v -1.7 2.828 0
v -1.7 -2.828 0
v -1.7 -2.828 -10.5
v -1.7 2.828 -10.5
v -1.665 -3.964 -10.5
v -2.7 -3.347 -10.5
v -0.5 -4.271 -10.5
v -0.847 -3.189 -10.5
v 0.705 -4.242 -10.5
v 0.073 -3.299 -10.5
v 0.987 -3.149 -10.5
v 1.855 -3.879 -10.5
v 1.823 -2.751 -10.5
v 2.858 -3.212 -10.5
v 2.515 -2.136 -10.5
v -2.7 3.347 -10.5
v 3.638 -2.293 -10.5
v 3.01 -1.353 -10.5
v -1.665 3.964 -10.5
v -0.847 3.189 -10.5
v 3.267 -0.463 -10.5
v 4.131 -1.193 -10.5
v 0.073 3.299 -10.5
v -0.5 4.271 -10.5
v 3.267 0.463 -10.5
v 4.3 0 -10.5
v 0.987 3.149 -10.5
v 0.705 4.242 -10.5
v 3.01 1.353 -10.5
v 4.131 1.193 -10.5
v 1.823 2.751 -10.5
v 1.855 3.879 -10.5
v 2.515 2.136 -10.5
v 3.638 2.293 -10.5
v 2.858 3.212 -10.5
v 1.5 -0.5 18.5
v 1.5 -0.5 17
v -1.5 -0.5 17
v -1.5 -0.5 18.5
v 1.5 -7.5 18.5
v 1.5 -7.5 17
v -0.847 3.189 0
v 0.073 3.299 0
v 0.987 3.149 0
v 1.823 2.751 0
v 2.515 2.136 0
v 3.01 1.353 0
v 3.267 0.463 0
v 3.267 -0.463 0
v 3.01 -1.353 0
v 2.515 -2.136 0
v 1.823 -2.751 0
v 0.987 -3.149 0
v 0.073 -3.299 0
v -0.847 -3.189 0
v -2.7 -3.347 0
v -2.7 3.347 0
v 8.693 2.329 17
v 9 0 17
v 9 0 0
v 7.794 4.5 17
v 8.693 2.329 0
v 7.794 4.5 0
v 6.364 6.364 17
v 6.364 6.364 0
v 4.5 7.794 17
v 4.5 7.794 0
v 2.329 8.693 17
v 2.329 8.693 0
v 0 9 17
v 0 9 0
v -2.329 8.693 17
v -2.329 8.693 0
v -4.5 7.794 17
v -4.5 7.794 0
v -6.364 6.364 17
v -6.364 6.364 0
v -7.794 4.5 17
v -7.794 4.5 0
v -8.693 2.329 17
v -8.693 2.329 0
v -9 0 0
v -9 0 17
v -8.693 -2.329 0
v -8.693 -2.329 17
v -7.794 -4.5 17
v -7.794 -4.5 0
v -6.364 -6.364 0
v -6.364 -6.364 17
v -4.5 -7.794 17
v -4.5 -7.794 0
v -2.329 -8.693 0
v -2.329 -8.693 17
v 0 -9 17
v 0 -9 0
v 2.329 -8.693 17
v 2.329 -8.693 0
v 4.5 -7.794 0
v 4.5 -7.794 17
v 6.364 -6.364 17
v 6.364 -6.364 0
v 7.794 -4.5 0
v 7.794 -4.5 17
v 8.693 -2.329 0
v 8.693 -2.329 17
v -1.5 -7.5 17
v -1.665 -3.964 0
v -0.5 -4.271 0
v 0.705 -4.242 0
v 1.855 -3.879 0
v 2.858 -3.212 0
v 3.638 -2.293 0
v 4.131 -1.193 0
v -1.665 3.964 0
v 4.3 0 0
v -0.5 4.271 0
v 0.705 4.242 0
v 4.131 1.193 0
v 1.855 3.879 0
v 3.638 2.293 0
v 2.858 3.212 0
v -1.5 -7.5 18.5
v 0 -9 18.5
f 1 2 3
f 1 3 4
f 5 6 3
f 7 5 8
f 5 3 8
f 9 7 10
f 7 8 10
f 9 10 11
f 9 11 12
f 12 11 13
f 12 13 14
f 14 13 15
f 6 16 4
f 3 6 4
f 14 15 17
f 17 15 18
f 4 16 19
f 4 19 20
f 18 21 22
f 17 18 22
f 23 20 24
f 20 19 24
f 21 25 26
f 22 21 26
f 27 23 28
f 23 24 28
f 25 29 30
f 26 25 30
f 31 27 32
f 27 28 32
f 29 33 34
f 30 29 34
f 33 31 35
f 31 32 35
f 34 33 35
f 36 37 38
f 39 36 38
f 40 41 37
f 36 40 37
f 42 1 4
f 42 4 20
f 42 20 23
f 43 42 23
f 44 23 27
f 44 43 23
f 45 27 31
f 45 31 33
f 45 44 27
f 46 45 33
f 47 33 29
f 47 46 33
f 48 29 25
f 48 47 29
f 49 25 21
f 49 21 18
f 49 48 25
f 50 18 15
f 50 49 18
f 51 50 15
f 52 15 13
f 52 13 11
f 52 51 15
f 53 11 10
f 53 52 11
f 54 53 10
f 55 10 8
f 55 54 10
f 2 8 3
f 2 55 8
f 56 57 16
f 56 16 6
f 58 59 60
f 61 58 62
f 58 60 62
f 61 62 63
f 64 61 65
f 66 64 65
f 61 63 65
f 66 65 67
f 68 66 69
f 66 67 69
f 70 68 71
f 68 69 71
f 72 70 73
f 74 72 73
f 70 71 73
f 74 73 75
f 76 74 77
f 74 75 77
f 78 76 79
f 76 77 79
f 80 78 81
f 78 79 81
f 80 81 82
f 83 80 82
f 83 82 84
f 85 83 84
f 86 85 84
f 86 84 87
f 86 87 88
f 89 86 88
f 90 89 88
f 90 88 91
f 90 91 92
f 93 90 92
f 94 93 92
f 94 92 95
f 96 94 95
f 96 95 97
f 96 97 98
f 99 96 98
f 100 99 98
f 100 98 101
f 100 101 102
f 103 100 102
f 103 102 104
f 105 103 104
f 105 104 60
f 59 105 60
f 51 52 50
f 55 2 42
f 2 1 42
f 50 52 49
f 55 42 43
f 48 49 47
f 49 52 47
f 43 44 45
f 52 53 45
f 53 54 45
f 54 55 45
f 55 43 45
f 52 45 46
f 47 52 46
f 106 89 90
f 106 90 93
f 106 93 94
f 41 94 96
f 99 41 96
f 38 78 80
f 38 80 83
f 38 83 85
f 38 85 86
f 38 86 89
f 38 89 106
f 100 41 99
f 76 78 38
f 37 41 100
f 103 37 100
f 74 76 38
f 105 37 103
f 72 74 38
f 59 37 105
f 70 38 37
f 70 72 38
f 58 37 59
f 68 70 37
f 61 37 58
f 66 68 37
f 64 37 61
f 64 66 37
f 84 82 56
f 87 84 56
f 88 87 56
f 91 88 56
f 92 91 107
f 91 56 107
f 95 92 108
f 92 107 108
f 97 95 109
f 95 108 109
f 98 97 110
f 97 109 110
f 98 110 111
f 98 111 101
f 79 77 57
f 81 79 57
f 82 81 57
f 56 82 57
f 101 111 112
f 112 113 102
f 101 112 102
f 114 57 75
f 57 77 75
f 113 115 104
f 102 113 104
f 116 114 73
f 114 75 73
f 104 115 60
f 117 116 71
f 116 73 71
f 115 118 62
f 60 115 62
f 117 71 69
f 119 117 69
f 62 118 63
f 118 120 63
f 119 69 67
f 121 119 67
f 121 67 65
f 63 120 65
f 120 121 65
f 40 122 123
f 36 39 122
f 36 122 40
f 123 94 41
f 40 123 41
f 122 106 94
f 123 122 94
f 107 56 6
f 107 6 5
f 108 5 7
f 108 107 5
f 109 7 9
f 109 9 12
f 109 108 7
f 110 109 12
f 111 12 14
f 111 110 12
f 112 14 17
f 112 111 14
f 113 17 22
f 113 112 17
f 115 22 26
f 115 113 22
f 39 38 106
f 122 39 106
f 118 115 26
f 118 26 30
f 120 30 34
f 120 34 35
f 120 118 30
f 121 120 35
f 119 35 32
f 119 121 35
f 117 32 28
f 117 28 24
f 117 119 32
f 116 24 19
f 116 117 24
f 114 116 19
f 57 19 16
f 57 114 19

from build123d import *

# Parameters (mm, degrees)
F0_R     = 9
F1_DEPTH = 17
F2_DEPTH = 10.5
F4_DEPTH = 1.5


# Not quite as in the source:
# - a feature names something its author has since deleted; it is built from what else it names


with BuildPart() as f1:
    # F0 (on Top) → F1 (new body)
    with BuildSketch(Plane.XY):
        Circle(F0_R)
        with BuildLine():
            ThreePointArc((-2.7, 3.3466401061), (1.8547236991, 3.8794329483), (4.3, 0))
            ThreePointArc((4.3, 0), (1.8547236991, -3.8794329483), (-2.7, -3.3466401061))
            ThreePointArc((-2.7, -3.3466401061), (-4.3, 0), (-2.7, 3.3466401061))
        make_face(mode=Mode.SUBTRACT)
        with BuildLine():
            ThreePointArc((-2.7, -3.3466401061), (1.8547236991, -3.8794329483), (4.3, 0))
            ThreePointArc((4.3, 0), (1.8547236991, 3.8794329483), (-2.7, 3.3466401061))
            Line((-2.7, 3.3466401061), (-2.7, -3.3466401061))
        make_face()
        with BuildLine():
            Line((-1.7, -2.8284271247), (-1.7, 2.8284271247))
            ThreePointArc((-1.7, 2.8284271247), (3.3, 0), (-1.7, -2.8284271247))
        make_face(mode=Mode.SUBTRACT)
        with BuildLine():
            ThreePointArc((-1.7, -2.8284271247), (3.3, 0), (-1.7, 2.8284271247))
            Line((-1.7, 2.8284271247), (-1.7, -2.8284271247))
        make_face()
        with BuildLine():
            Line((-2.7, -3.3466401061), (-2.7, 3.3466401061))
            ThreePointArc((-2.7, 3.3466401061), (-4.3, 0), (-2.7, -3.3466401061))
        make_face()
    extrude(amount=F1_DEPTH)

    # F0 (on Top) → F2 (join)
    with BuildSketch(Plane.XY):
        with BuildLine():
            ThreePointArc((-2.7, -3.3466401061), (1.8547236991, -3.8794329483), (4.3, 0))
            ThreePointArc((4.3, 0), (1.8547236991, 3.8794329483), (-2.7, 3.3466401061))
            Line((-2.7, 3.3466401061), (-2.7, -3.3466401061))
        make_face()
        with BuildLine():
            Line((-1.7, -2.8284271247), (-1.7, 2.8284271247))
            ThreePointArc((-1.7, 2.8284271247), (3.3, 0), (-1.7, -2.8284271247))
        make_face(mode=Mode.SUBTRACT)
    extrude(amount=-F2_DEPTH)

    # F3 (on face) → F4 (join)
    with BuildSketch(Plane.XY.offset(17)):
        Polygon((-1.5, -7.5), (0, -9), (1.5, -7.5), (1.5, -0.5), (-1.5, -0.5), align=None)
    extrude(amount=F4_DEPTH)


solid = f1.part
